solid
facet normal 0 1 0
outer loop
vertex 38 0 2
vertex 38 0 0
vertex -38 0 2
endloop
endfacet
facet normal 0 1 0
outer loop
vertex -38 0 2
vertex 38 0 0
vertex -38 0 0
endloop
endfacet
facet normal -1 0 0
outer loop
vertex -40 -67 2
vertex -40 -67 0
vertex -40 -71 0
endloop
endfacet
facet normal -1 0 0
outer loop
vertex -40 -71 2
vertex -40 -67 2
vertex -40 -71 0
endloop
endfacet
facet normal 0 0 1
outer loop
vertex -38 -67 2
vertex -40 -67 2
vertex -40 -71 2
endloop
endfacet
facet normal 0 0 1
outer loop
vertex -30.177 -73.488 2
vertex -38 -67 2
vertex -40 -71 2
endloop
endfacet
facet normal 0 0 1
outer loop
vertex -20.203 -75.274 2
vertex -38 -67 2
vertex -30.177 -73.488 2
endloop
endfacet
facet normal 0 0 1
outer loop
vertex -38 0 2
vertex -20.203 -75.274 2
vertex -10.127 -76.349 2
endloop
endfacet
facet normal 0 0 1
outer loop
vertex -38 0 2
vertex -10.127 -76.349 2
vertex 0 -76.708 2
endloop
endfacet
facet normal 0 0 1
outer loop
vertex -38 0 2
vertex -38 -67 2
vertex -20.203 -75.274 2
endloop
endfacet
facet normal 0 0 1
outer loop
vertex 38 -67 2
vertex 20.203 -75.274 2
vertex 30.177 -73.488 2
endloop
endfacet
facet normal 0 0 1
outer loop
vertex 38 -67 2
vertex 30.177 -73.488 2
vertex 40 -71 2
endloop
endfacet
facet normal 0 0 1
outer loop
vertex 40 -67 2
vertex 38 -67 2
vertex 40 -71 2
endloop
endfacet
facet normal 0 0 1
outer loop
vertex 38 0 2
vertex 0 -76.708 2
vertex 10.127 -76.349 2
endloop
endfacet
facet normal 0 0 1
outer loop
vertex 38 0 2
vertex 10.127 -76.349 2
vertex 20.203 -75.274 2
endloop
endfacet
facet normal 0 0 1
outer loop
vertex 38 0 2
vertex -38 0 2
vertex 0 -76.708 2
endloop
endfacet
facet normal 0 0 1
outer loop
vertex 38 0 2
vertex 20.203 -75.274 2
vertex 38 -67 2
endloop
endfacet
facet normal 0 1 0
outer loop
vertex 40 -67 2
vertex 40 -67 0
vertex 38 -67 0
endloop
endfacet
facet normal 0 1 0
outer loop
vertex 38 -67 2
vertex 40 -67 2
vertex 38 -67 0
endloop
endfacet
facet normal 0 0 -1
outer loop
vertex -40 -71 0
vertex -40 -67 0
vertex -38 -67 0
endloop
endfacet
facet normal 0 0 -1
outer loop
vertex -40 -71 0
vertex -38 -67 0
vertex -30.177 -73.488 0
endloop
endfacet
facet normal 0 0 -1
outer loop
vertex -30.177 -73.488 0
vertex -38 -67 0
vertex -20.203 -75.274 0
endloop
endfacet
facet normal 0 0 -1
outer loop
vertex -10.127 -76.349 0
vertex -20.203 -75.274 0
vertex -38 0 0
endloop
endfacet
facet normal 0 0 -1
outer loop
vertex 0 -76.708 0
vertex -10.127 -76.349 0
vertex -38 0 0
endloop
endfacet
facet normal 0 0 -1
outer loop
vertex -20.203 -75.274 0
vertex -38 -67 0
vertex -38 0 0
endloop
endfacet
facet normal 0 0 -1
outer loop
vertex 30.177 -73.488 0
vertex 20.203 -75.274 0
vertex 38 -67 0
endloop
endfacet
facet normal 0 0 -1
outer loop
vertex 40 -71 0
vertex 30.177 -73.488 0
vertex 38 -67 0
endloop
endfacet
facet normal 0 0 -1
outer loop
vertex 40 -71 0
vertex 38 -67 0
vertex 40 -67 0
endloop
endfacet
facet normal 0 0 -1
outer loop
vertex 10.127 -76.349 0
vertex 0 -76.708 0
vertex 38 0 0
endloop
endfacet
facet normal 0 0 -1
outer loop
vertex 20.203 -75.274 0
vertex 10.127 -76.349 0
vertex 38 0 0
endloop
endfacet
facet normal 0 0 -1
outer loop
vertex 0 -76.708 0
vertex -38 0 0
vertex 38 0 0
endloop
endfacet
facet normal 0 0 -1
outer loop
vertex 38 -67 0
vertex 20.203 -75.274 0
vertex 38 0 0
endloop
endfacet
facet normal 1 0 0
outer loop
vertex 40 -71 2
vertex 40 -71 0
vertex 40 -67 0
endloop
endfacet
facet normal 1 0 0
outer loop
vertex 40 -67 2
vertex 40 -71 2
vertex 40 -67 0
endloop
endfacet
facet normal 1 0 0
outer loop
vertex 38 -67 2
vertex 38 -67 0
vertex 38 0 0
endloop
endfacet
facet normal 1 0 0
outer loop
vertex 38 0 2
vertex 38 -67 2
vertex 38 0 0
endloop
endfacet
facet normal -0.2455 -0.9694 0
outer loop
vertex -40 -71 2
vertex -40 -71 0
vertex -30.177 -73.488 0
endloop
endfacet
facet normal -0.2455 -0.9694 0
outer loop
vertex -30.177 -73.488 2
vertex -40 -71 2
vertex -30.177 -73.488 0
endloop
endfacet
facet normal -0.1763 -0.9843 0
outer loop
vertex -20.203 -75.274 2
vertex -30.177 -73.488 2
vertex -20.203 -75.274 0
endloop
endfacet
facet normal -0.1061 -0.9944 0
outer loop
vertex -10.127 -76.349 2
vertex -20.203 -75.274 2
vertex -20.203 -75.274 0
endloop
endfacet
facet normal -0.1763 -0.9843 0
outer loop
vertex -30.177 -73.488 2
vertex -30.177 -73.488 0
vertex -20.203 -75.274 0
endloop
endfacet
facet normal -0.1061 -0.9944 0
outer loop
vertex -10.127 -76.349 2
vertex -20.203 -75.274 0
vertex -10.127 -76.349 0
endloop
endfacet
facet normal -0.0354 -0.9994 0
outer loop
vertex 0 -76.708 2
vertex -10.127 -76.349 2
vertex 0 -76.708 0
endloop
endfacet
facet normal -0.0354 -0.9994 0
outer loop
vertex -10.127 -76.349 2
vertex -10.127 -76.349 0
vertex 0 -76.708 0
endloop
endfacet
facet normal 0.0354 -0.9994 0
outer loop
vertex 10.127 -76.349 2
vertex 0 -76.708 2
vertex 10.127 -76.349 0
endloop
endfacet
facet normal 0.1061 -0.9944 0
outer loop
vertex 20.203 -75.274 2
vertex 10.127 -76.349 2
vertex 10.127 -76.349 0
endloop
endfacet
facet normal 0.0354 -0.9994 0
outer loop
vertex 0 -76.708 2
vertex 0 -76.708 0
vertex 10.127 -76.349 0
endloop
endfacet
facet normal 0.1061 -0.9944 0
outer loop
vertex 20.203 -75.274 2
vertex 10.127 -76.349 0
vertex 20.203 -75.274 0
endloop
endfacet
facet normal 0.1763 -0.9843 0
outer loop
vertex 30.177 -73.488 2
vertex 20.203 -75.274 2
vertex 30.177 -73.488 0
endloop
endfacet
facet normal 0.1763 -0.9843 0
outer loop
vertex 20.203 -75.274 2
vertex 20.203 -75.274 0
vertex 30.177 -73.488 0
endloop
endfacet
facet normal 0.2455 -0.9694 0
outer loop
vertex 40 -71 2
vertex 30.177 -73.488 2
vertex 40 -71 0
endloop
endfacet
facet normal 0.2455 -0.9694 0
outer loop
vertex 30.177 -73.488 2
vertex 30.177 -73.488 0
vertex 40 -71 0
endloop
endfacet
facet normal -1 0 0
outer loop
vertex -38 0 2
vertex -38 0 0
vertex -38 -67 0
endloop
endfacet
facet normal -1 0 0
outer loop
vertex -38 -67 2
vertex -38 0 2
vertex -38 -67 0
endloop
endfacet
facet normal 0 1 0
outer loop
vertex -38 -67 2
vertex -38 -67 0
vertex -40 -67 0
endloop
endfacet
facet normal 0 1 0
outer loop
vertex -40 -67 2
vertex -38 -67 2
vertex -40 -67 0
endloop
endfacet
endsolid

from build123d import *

# Parameters (mm, degrees)
BOSS_EXTRUDE1_DEPTH = 2


with BuildPart() as part:
    # Sketch2 → Boss-Extrude1 (new body)
    with BuildSketch(Plane.XY):
        with BuildLine():
            Line((38, 0), (-38, 0))
            Line((-38, 0), (-38, -67))
            Line((-38, -67), (-40, -67))
            Line((-40, -67), (-40, -71))
            ThreePointArc((-40, -71), (0, -76.708339656), (40, -71))
            Line((40, -71), (40, -67))
            Line((40, -67), (38, -67))
            Line((38, -67), (38, 0))
        make_face()
    extrude(amount=BOSS_EXTRUDE1_DEPTH)


solid = part.part
